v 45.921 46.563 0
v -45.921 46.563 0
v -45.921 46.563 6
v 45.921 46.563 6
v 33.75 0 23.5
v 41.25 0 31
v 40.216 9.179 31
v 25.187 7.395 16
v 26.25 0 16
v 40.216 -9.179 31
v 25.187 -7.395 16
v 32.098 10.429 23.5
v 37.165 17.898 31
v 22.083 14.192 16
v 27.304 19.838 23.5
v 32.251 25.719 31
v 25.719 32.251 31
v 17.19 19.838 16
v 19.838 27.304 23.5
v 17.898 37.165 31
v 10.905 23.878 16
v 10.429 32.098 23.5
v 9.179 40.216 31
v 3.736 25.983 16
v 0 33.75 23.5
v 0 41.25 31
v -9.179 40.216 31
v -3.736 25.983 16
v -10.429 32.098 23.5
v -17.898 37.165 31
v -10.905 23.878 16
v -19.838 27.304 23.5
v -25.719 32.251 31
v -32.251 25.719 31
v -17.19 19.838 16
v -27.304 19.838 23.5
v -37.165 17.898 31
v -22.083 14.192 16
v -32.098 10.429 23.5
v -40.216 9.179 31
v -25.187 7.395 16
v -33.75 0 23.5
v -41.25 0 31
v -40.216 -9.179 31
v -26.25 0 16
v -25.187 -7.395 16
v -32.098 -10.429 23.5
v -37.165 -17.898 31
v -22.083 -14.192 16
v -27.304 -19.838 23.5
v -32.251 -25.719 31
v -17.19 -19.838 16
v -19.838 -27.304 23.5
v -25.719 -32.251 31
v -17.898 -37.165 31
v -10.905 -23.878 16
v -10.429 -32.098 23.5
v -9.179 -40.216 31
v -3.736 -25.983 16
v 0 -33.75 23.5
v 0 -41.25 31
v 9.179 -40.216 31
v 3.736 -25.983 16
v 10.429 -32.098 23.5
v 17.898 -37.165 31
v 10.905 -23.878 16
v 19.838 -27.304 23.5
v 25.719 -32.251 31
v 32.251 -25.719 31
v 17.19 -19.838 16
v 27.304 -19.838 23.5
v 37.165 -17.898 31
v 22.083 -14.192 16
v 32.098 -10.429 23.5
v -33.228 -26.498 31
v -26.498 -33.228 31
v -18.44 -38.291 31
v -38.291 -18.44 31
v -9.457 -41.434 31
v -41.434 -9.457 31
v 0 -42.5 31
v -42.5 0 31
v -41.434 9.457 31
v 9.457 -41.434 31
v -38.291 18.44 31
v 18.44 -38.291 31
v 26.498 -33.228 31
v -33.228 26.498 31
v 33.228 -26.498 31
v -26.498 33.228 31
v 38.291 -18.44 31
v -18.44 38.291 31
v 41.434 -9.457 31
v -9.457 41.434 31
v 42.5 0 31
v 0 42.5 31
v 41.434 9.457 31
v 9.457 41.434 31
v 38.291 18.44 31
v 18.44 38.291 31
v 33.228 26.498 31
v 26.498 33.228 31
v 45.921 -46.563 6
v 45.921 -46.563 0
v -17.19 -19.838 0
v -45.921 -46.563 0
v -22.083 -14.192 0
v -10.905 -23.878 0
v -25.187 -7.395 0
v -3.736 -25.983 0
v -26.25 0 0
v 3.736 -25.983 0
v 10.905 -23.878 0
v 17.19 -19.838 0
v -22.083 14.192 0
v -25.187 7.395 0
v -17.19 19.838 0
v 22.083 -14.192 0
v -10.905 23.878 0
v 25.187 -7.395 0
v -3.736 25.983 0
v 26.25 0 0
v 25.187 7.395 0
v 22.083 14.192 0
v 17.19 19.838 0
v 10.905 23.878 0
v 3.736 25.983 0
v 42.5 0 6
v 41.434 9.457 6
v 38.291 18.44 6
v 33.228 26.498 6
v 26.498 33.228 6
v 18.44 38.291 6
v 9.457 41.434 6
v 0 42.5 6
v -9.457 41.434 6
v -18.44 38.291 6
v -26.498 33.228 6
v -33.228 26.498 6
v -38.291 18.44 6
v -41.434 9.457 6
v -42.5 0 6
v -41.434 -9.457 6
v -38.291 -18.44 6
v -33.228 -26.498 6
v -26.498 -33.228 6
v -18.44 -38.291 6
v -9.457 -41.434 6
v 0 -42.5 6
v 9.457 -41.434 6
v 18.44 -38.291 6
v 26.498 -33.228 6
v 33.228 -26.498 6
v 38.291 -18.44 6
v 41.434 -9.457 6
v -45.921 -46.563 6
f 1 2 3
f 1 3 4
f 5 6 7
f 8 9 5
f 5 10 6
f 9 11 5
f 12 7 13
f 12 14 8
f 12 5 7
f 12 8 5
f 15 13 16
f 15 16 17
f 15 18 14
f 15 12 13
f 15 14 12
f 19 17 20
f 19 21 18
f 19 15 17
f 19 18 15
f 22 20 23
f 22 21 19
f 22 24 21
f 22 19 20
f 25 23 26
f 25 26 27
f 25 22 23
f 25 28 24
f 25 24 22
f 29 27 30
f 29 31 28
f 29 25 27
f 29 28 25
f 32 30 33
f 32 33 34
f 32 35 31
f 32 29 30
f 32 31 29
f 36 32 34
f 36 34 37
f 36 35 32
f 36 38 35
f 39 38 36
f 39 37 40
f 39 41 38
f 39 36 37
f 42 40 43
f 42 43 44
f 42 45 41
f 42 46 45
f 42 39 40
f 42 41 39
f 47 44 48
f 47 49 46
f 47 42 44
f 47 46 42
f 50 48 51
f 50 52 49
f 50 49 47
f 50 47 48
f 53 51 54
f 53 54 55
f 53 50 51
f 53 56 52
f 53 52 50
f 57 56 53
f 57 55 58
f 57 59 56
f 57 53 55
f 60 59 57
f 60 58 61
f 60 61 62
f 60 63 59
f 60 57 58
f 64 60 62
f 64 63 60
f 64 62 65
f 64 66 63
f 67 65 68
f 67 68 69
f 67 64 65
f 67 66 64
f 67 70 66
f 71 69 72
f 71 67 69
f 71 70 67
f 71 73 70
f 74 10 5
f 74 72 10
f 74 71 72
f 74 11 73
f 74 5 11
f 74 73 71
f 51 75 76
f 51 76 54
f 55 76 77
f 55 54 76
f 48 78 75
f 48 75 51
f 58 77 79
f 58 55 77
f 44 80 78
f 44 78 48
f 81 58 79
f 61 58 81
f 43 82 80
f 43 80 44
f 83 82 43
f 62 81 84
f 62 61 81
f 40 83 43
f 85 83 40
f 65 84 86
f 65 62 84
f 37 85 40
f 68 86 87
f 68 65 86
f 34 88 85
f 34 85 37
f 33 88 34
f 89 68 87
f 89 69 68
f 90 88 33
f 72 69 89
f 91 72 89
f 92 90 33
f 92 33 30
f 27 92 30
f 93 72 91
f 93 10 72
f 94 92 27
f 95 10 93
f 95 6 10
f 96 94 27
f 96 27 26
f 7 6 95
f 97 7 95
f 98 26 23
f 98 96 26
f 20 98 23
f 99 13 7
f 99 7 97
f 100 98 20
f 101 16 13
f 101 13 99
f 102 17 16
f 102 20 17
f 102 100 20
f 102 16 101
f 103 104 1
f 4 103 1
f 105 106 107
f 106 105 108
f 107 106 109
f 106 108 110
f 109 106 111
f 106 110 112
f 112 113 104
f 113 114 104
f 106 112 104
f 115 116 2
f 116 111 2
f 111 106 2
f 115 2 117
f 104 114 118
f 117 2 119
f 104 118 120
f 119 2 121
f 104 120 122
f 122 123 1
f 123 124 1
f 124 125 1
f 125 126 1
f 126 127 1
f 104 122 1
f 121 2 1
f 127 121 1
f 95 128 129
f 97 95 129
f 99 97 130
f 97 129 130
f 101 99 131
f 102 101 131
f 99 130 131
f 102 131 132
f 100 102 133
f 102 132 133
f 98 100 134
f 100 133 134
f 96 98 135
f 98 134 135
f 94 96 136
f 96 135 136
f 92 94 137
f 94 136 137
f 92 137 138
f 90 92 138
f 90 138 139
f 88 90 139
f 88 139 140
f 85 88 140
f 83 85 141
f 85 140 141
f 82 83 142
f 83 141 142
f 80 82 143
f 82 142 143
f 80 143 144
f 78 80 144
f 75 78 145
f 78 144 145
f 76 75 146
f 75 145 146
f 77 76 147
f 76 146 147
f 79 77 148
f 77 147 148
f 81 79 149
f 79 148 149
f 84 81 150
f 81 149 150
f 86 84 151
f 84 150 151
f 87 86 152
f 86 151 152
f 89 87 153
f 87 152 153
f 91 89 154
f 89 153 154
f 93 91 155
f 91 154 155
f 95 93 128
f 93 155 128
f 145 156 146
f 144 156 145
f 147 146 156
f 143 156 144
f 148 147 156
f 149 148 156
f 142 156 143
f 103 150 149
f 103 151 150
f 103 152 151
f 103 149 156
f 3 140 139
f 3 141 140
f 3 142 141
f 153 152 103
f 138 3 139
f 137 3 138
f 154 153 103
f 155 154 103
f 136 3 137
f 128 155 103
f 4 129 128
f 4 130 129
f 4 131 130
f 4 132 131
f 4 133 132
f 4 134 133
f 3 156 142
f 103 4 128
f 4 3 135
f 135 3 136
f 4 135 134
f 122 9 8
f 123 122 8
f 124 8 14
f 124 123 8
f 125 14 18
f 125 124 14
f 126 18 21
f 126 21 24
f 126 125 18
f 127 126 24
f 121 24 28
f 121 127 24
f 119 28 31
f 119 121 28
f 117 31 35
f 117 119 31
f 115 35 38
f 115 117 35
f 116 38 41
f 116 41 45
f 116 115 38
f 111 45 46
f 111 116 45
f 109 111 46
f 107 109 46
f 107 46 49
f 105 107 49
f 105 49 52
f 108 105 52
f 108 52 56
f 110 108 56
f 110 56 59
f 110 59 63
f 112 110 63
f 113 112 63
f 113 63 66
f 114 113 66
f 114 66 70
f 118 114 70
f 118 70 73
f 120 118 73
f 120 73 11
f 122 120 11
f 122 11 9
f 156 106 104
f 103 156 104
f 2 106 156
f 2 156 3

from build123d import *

# Parameters (mm, degrees)
F0_W     = 91.8421666365
F0_H     = 93.1266715601
F0_R     = 26.25
F1_DEPTH = 6
F2_R     = 42.5
F2_R_2   = 26.25
F3_DEPTH = 25
F4_SIZE  = 15


with BuildPart() as f1:
    # F0 (on Top) → F1 (new body)
    with BuildSketch(Plane.XY):
        Rectangle(F0_W, F0_H)
        Circle(F0_R, mode=Mode.SUBTRACT)
    extrude(amount=F1_DEPTH)

    # F2 (on face) → F3 (join)
    with BuildSketch(Plane.XY.offset(6)):
        Circle(F2_R)
        Circle(F2_R_2, mode=Mode.SUBTRACT)
    extrude(amount=F3_DEPTH)

    # F4
    f4_edges = [f1.edges().sort_by_distance(p)[0] for p in [
        (-26.25, 0, 31),
    ]]
    chamfer(f4_edges, length=F4_SIZE)


solid = f1.part
